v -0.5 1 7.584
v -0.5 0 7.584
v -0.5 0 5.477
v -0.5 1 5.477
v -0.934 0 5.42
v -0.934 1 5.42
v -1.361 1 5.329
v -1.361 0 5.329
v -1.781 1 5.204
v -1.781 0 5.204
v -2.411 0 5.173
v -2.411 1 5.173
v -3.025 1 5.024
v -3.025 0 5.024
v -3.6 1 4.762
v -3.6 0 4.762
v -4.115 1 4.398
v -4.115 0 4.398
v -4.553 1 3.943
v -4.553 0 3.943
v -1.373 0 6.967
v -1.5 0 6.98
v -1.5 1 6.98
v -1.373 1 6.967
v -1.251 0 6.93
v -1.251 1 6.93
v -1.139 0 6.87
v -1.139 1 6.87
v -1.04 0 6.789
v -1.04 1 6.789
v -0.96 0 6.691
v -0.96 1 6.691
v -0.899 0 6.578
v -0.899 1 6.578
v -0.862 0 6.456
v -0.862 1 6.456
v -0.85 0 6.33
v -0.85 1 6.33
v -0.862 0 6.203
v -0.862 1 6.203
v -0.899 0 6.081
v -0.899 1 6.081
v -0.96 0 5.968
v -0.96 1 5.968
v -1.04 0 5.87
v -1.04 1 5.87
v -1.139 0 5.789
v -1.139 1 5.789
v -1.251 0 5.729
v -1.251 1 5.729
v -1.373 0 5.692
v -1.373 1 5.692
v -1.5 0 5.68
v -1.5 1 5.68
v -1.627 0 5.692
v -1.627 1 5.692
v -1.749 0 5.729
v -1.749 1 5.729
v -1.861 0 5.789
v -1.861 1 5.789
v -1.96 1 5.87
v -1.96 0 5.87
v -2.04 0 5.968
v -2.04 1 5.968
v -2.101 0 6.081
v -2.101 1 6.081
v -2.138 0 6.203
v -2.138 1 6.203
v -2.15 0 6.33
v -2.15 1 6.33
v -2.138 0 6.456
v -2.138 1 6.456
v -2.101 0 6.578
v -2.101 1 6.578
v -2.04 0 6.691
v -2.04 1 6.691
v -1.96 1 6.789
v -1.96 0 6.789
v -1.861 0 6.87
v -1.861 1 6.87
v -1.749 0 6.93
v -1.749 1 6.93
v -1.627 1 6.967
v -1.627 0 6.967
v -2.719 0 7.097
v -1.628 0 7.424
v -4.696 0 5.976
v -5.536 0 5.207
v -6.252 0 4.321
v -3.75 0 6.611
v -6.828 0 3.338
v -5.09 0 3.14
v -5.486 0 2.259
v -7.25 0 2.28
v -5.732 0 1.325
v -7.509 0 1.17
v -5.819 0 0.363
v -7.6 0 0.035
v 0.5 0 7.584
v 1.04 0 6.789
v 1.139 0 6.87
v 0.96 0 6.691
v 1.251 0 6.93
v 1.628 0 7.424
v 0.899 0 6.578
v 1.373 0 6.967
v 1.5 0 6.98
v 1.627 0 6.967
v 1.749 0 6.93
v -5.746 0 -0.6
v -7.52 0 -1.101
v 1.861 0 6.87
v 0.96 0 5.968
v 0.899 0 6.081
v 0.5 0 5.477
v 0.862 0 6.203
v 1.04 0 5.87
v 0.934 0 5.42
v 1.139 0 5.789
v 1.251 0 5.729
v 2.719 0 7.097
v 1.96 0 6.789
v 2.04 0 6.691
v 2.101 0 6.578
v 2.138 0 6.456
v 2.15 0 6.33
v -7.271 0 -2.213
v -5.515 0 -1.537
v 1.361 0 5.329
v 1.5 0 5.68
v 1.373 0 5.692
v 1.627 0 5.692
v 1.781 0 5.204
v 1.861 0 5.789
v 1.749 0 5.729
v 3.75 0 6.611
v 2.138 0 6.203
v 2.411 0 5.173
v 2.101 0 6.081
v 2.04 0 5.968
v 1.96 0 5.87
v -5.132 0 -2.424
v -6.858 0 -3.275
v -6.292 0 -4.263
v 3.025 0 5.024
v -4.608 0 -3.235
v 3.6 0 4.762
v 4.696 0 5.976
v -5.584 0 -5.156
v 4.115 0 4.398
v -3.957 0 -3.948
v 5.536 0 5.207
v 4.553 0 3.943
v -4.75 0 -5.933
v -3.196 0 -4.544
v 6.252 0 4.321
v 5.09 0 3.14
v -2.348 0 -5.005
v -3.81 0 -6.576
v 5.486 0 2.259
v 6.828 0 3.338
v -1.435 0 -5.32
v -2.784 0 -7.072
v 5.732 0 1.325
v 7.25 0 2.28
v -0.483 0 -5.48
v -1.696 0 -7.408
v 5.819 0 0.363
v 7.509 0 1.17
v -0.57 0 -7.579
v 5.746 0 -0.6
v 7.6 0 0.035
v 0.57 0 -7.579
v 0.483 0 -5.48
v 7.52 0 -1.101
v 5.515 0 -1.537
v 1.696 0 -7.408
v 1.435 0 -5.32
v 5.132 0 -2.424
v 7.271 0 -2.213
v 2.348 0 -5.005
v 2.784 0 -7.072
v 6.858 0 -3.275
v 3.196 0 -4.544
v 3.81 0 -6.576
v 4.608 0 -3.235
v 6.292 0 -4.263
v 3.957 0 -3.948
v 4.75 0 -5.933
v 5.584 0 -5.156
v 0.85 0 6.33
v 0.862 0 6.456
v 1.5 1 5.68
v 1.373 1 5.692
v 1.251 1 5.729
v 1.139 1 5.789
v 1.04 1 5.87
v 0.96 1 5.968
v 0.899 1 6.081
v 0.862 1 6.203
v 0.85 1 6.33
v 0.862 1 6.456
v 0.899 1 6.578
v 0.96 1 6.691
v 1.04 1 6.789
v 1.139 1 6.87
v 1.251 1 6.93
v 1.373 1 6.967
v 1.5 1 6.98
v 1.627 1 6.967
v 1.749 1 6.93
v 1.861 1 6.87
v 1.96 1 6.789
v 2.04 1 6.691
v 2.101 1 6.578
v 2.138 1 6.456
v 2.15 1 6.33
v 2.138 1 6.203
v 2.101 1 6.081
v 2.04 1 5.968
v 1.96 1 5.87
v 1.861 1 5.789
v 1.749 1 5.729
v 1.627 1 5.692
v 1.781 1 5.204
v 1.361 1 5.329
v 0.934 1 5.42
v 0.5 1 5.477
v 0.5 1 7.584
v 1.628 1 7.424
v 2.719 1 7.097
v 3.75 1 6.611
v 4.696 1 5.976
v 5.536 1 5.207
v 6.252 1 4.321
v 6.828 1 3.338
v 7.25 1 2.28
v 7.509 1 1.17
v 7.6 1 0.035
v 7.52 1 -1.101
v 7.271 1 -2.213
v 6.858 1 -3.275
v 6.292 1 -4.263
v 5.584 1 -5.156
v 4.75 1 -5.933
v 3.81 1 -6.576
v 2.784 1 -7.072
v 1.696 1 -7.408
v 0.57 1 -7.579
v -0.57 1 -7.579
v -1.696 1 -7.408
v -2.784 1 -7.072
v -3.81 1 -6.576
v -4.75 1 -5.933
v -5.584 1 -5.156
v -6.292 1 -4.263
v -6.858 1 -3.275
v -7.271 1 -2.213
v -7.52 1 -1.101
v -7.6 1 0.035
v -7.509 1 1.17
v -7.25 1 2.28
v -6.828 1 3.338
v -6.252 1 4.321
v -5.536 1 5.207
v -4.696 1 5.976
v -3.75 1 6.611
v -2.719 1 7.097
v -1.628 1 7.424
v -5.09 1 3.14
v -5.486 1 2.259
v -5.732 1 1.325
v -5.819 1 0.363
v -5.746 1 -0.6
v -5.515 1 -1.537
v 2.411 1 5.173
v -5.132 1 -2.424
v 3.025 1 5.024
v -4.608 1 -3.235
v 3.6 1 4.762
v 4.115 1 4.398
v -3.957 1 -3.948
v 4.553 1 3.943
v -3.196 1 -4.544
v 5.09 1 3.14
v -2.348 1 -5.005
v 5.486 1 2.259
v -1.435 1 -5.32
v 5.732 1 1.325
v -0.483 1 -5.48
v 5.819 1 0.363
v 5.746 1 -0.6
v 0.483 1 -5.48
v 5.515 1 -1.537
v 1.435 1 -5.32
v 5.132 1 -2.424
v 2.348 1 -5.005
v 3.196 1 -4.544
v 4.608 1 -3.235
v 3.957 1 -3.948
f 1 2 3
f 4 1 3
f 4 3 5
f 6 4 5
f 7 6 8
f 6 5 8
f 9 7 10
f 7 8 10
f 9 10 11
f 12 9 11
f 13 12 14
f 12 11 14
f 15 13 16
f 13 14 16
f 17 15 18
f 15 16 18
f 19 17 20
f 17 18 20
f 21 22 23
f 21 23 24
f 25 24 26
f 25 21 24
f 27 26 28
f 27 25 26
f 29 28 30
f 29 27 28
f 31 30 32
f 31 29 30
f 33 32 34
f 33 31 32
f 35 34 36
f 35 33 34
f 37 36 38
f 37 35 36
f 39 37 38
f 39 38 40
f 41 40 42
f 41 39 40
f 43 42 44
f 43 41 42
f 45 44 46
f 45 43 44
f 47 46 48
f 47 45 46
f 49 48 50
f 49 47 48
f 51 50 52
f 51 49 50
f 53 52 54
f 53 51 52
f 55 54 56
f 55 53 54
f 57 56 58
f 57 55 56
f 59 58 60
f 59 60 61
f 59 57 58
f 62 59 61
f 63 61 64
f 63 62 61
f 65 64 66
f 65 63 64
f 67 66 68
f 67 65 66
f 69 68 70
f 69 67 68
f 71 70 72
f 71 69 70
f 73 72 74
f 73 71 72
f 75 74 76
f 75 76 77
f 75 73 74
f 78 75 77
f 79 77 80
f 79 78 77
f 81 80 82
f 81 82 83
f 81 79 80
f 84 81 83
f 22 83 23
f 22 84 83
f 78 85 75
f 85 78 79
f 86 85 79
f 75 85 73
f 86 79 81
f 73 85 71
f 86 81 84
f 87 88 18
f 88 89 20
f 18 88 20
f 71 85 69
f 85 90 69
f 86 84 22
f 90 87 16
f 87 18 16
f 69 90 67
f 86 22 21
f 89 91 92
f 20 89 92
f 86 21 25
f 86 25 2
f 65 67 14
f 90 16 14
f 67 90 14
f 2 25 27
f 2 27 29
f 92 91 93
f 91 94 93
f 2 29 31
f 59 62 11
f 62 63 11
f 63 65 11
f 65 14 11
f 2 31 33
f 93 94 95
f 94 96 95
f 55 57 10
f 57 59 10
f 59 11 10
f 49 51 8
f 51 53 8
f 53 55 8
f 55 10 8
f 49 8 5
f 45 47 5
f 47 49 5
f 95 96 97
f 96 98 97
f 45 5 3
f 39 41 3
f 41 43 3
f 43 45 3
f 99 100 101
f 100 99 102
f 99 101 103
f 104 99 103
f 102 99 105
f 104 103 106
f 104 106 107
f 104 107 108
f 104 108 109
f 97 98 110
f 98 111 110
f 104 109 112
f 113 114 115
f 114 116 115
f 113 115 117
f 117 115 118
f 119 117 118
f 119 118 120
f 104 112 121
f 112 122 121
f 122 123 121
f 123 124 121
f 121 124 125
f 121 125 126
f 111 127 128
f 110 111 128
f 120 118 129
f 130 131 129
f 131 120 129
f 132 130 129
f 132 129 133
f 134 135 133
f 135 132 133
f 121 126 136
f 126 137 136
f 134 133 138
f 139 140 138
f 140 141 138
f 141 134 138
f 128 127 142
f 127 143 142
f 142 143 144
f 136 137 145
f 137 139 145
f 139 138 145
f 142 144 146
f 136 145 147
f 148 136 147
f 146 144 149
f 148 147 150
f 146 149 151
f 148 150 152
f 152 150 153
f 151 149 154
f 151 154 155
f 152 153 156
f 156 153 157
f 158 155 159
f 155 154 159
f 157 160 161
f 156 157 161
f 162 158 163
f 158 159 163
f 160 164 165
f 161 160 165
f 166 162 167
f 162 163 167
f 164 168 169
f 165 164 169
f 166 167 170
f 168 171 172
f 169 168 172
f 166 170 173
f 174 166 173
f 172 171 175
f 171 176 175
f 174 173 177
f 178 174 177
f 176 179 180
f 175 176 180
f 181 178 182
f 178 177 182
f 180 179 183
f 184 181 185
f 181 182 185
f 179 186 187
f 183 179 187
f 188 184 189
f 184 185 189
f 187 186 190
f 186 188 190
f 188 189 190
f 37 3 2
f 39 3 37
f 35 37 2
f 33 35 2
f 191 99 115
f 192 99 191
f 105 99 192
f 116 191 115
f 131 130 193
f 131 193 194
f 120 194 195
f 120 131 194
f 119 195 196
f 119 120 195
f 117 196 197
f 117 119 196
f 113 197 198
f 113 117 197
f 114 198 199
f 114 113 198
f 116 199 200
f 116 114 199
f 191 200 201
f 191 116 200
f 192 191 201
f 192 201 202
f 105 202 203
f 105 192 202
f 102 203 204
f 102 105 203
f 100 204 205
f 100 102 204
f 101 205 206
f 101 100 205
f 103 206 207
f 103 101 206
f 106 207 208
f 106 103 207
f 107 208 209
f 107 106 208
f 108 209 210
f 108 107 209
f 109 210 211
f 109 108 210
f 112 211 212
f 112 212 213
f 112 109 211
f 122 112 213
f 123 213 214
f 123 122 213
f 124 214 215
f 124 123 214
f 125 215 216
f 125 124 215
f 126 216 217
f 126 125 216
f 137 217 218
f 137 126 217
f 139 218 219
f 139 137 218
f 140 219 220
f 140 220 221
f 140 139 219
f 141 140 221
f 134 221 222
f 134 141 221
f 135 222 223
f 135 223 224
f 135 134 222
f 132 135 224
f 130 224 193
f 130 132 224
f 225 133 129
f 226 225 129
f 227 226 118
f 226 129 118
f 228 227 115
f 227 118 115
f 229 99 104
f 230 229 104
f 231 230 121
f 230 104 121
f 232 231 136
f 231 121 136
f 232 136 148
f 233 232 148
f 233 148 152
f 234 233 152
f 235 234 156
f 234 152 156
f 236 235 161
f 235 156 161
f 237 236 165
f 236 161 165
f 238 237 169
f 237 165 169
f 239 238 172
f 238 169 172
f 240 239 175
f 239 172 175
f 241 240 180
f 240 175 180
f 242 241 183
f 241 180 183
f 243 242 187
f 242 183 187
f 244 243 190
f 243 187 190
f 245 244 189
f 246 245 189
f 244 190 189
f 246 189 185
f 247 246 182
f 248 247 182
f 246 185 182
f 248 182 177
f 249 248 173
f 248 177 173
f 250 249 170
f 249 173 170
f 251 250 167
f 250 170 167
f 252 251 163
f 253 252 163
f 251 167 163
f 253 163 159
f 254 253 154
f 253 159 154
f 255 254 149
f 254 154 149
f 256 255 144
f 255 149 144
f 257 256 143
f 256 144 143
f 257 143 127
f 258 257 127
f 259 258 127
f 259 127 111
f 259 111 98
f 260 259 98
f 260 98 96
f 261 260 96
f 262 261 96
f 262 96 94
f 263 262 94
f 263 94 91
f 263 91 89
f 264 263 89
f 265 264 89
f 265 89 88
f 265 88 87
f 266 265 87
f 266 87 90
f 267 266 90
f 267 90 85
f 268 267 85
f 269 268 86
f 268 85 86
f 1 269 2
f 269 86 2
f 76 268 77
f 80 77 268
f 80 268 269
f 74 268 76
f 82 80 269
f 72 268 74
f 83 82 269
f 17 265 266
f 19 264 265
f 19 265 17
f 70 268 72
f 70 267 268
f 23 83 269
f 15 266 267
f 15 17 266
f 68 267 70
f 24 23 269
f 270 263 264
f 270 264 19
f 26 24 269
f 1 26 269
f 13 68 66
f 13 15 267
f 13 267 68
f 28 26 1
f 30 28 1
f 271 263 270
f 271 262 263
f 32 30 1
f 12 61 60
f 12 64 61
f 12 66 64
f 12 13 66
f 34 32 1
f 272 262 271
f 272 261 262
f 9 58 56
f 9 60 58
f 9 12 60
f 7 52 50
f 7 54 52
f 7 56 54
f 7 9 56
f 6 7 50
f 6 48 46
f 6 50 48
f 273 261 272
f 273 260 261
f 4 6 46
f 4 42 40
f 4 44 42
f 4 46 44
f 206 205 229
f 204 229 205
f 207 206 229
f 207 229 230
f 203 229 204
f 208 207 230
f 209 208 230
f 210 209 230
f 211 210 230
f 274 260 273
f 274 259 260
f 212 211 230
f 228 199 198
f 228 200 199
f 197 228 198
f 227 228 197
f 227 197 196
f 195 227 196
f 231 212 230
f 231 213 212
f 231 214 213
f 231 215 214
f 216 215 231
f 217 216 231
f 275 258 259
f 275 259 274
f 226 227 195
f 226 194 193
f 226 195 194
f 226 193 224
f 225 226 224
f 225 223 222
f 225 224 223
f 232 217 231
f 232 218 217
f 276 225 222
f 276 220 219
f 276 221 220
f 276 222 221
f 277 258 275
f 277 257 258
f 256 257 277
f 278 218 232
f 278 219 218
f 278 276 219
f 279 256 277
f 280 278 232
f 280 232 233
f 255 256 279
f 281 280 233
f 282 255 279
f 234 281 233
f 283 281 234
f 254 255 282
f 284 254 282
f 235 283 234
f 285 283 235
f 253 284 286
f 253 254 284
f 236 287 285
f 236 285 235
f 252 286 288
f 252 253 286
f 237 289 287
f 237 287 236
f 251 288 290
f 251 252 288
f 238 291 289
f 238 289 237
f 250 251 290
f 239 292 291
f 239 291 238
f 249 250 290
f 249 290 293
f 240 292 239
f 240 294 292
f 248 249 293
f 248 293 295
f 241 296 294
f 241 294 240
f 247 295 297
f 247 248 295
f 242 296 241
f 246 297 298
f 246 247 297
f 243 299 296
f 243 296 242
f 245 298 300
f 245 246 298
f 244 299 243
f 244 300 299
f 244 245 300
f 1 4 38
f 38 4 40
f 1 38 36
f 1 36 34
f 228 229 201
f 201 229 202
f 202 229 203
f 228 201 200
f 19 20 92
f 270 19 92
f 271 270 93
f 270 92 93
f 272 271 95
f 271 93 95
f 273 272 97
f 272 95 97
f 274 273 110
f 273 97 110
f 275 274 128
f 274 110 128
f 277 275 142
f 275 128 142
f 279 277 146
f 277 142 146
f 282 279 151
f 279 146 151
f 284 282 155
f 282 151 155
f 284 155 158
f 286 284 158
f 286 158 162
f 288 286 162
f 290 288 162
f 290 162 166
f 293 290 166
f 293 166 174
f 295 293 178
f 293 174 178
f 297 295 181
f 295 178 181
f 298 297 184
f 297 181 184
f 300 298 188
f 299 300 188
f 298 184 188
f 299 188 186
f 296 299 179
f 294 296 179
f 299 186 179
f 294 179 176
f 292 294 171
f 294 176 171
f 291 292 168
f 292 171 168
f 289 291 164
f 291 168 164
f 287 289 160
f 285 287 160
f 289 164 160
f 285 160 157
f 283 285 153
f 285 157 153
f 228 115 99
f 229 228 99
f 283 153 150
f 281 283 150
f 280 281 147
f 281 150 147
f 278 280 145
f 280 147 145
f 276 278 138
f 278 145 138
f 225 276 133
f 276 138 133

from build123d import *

# Parameters (mm, degrees)
SKETCH1_R           = 0.65
BOSS_EXTRUDE1_DEPTH = 1


with BuildPart() as part:
    # Sketch1 → Boss-Extrude1 (new body)
    with BuildSketch(Plane(origin=(0, 0, 0), x_dir=(1, 0, 0), z_dir=(0, 1, 0))):
        with BuildLine():
            Line((-0.5, -7.583534796), (-0.5, -5.477225575))
            ThreePointArc((-0.5, -5.477225575), (-1.148443874, -5.37876163), (-1.780556133, -5.203808207))
            ThreePointArc((-1.780556133, -5.203808207), (-3.318545169, -4.906574915), (-4.553408035, -3.94279506))
            ThreePointArc((-4.553408035, -3.94279506), (0, 5.5), (4.553408035, -3.94279506))
            ThreePointArc((4.553408035, -3.94279506), (3.318545169, -4.906574915), (1.780556133, -5.203808207))
            ThreePointArc((1.780556133, -5.203808207), (1.148443874, -5.37876163), (0.5, -5.477225575))
            Line((0.5, -5.477225575), (0.5, -7.583534796))
            ThreePointArc((0.5, -7.583534796), (0, 7.6), (-0.5, -7.583534796))
        make_face()
        with Locations((-1.5, -6.329588857)):
            Circle(SKETCH1_R, mode=Mode.SUBTRACT)
        with Locations((1.5, -6.329588857)):
            Circle(SKETCH1_R, mode=Mode.SUBTRACT)
    extrude(amount=BOSS_EXTRUDE1_DEPTH)


solid = part.part
